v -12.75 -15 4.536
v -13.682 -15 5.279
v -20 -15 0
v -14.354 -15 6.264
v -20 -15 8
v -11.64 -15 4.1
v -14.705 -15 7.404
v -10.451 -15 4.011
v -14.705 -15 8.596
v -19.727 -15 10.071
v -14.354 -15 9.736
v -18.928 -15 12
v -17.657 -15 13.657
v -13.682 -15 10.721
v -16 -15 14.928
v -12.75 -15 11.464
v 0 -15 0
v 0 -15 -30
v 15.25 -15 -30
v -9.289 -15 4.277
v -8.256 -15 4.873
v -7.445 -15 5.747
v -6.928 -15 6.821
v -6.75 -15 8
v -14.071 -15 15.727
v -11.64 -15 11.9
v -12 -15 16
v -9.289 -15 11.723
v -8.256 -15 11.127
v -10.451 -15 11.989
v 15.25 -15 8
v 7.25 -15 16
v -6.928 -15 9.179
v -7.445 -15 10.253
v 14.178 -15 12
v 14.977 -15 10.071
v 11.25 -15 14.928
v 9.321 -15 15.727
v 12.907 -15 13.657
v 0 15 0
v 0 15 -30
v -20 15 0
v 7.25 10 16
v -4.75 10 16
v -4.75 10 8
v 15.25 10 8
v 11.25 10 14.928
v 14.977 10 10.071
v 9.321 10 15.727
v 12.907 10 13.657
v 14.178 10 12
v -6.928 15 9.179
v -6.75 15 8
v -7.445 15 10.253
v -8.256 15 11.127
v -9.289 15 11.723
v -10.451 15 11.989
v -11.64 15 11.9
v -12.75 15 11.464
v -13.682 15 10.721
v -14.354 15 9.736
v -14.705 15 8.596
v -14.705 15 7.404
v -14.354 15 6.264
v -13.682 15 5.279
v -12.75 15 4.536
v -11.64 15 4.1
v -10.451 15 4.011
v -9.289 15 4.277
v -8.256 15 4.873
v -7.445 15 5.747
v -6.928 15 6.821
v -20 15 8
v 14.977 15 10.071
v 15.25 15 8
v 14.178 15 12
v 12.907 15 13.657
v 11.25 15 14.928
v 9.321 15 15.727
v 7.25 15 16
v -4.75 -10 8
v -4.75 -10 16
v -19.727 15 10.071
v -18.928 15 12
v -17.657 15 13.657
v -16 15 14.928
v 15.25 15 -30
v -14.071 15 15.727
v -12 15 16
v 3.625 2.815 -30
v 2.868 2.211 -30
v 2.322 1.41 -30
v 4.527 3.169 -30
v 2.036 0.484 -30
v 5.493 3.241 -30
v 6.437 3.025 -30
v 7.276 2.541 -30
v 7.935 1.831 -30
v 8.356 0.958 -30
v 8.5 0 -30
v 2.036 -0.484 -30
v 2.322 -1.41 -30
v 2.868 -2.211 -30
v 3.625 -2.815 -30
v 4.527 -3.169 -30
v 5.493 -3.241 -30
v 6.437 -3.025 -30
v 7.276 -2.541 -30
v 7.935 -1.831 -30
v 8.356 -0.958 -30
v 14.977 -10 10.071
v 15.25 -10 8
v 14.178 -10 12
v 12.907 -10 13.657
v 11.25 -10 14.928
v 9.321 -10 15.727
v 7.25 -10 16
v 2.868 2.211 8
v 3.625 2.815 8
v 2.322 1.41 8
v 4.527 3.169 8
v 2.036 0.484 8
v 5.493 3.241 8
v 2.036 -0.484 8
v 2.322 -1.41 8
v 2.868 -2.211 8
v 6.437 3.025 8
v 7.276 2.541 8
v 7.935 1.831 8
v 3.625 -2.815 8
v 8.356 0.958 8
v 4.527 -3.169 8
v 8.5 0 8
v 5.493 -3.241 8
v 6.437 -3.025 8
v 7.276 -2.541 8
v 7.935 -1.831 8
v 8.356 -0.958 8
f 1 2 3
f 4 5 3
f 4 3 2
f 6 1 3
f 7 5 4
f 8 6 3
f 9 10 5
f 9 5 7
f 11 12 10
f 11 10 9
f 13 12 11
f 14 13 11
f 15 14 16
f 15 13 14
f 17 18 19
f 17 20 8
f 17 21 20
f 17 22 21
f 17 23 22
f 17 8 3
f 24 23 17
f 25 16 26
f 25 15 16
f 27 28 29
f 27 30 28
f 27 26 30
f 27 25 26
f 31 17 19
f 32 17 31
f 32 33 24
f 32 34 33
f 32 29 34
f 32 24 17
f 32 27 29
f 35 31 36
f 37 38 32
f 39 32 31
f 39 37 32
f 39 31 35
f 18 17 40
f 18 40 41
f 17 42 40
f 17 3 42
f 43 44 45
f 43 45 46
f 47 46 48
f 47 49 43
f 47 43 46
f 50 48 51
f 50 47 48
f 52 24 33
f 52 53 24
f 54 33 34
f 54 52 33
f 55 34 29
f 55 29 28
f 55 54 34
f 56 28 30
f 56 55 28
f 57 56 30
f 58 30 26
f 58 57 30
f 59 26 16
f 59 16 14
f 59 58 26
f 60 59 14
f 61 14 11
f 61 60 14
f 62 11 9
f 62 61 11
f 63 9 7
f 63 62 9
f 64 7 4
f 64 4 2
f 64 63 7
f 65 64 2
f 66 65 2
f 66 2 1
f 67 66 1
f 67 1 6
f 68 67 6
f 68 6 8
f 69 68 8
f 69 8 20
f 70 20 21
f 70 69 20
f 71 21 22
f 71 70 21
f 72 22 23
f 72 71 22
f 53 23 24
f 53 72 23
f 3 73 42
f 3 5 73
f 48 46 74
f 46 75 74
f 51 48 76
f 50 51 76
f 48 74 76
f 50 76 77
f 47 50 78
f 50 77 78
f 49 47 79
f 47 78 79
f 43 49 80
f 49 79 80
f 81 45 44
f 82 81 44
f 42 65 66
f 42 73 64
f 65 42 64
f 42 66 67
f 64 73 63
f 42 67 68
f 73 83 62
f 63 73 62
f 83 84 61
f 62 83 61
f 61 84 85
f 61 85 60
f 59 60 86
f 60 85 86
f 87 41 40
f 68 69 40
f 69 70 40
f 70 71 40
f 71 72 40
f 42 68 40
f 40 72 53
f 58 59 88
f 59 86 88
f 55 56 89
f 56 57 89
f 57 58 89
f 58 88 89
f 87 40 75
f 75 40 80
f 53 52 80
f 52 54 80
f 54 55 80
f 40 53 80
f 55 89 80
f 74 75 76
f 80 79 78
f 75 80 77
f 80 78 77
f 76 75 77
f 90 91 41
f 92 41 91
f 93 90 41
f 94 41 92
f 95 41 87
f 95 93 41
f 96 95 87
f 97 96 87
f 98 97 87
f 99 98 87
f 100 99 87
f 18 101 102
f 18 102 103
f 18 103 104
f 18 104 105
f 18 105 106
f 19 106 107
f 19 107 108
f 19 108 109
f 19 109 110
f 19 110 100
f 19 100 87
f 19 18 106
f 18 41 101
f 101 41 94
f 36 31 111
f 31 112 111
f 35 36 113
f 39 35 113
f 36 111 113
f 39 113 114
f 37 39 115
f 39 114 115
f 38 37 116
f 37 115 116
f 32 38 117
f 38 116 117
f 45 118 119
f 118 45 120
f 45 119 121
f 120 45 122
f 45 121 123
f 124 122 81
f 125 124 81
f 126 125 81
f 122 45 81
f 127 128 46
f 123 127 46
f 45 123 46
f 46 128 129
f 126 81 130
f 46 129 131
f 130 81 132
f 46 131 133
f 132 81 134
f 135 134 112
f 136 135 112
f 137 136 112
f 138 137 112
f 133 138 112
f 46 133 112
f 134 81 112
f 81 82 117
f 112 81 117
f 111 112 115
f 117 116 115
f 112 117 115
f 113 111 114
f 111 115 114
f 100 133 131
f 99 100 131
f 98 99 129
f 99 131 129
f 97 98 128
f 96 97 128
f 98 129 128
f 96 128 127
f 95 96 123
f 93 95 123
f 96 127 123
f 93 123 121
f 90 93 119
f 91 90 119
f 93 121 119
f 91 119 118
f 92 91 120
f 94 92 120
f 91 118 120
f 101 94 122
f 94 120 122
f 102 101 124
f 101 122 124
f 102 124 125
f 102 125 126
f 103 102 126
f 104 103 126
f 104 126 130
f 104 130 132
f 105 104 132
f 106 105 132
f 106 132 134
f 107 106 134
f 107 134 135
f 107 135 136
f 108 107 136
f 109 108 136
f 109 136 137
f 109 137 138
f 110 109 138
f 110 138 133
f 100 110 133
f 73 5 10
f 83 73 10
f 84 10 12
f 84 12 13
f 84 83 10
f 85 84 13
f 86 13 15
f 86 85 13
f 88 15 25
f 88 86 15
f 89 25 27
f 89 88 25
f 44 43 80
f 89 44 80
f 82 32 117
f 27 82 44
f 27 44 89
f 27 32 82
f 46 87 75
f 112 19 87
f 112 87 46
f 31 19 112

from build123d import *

# Parameters (mm, degrees)
F0_R     = 4
F0_W     = 20
F0_H     = 8
F1_DEPTH = 15
F2_DEPTH = 10
F3_R     = 3.25
F4_DEPTH = 38.001
F5_R     = 8


with BuildPart() as f1:
    # F0 (on Front) → F1 (new body, symmetric)
    with BuildSketch(Plane.XZ):
        Polygon((-20, 0), (0, 0), (0, -30), (15.25, -30), (15.25, 8), (-4.75, 8), (-4.75, 16), (-20, 16), align=None)
        with Locations((-10.75, 8)):
            Circle(F0_R, mode=Mode.SUBTRACT)
        with Locations((5.25, 12)):
            Rectangle(F0_W, F0_H)
    extrude(amount=F1_DEPTH, both=True)

    # F0 (on Front) → F2 (cut, symmetric)
    with BuildSketch(Plane.XZ):
        with Locations((5.25, 12)):
            Rectangle(F0_W, F0_H)
    extrude(amount=F2_DEPTH, both=True, mode=Mode.SUBTRACT)

    # F3 (on face) → F4 (cut, through all)
    with BuildSketch(Plane.XY.offset(8)):
        with Locations((5.25, 0)):
            Circle(F3_R)
    extrude(amount=-F4_DEPTH, mode=Mode.SUBTRACT)

    # F5
    f5_edges = [f1.edges().sort_by_distance(p)[0] for p in [
        (-20, 0, 16),
        (15.25, -12.5, 16),
        (15.25, 12.5, 16),
    ]]
    fillet(f5_edges, radius=F5_R)


solid = f1.part
